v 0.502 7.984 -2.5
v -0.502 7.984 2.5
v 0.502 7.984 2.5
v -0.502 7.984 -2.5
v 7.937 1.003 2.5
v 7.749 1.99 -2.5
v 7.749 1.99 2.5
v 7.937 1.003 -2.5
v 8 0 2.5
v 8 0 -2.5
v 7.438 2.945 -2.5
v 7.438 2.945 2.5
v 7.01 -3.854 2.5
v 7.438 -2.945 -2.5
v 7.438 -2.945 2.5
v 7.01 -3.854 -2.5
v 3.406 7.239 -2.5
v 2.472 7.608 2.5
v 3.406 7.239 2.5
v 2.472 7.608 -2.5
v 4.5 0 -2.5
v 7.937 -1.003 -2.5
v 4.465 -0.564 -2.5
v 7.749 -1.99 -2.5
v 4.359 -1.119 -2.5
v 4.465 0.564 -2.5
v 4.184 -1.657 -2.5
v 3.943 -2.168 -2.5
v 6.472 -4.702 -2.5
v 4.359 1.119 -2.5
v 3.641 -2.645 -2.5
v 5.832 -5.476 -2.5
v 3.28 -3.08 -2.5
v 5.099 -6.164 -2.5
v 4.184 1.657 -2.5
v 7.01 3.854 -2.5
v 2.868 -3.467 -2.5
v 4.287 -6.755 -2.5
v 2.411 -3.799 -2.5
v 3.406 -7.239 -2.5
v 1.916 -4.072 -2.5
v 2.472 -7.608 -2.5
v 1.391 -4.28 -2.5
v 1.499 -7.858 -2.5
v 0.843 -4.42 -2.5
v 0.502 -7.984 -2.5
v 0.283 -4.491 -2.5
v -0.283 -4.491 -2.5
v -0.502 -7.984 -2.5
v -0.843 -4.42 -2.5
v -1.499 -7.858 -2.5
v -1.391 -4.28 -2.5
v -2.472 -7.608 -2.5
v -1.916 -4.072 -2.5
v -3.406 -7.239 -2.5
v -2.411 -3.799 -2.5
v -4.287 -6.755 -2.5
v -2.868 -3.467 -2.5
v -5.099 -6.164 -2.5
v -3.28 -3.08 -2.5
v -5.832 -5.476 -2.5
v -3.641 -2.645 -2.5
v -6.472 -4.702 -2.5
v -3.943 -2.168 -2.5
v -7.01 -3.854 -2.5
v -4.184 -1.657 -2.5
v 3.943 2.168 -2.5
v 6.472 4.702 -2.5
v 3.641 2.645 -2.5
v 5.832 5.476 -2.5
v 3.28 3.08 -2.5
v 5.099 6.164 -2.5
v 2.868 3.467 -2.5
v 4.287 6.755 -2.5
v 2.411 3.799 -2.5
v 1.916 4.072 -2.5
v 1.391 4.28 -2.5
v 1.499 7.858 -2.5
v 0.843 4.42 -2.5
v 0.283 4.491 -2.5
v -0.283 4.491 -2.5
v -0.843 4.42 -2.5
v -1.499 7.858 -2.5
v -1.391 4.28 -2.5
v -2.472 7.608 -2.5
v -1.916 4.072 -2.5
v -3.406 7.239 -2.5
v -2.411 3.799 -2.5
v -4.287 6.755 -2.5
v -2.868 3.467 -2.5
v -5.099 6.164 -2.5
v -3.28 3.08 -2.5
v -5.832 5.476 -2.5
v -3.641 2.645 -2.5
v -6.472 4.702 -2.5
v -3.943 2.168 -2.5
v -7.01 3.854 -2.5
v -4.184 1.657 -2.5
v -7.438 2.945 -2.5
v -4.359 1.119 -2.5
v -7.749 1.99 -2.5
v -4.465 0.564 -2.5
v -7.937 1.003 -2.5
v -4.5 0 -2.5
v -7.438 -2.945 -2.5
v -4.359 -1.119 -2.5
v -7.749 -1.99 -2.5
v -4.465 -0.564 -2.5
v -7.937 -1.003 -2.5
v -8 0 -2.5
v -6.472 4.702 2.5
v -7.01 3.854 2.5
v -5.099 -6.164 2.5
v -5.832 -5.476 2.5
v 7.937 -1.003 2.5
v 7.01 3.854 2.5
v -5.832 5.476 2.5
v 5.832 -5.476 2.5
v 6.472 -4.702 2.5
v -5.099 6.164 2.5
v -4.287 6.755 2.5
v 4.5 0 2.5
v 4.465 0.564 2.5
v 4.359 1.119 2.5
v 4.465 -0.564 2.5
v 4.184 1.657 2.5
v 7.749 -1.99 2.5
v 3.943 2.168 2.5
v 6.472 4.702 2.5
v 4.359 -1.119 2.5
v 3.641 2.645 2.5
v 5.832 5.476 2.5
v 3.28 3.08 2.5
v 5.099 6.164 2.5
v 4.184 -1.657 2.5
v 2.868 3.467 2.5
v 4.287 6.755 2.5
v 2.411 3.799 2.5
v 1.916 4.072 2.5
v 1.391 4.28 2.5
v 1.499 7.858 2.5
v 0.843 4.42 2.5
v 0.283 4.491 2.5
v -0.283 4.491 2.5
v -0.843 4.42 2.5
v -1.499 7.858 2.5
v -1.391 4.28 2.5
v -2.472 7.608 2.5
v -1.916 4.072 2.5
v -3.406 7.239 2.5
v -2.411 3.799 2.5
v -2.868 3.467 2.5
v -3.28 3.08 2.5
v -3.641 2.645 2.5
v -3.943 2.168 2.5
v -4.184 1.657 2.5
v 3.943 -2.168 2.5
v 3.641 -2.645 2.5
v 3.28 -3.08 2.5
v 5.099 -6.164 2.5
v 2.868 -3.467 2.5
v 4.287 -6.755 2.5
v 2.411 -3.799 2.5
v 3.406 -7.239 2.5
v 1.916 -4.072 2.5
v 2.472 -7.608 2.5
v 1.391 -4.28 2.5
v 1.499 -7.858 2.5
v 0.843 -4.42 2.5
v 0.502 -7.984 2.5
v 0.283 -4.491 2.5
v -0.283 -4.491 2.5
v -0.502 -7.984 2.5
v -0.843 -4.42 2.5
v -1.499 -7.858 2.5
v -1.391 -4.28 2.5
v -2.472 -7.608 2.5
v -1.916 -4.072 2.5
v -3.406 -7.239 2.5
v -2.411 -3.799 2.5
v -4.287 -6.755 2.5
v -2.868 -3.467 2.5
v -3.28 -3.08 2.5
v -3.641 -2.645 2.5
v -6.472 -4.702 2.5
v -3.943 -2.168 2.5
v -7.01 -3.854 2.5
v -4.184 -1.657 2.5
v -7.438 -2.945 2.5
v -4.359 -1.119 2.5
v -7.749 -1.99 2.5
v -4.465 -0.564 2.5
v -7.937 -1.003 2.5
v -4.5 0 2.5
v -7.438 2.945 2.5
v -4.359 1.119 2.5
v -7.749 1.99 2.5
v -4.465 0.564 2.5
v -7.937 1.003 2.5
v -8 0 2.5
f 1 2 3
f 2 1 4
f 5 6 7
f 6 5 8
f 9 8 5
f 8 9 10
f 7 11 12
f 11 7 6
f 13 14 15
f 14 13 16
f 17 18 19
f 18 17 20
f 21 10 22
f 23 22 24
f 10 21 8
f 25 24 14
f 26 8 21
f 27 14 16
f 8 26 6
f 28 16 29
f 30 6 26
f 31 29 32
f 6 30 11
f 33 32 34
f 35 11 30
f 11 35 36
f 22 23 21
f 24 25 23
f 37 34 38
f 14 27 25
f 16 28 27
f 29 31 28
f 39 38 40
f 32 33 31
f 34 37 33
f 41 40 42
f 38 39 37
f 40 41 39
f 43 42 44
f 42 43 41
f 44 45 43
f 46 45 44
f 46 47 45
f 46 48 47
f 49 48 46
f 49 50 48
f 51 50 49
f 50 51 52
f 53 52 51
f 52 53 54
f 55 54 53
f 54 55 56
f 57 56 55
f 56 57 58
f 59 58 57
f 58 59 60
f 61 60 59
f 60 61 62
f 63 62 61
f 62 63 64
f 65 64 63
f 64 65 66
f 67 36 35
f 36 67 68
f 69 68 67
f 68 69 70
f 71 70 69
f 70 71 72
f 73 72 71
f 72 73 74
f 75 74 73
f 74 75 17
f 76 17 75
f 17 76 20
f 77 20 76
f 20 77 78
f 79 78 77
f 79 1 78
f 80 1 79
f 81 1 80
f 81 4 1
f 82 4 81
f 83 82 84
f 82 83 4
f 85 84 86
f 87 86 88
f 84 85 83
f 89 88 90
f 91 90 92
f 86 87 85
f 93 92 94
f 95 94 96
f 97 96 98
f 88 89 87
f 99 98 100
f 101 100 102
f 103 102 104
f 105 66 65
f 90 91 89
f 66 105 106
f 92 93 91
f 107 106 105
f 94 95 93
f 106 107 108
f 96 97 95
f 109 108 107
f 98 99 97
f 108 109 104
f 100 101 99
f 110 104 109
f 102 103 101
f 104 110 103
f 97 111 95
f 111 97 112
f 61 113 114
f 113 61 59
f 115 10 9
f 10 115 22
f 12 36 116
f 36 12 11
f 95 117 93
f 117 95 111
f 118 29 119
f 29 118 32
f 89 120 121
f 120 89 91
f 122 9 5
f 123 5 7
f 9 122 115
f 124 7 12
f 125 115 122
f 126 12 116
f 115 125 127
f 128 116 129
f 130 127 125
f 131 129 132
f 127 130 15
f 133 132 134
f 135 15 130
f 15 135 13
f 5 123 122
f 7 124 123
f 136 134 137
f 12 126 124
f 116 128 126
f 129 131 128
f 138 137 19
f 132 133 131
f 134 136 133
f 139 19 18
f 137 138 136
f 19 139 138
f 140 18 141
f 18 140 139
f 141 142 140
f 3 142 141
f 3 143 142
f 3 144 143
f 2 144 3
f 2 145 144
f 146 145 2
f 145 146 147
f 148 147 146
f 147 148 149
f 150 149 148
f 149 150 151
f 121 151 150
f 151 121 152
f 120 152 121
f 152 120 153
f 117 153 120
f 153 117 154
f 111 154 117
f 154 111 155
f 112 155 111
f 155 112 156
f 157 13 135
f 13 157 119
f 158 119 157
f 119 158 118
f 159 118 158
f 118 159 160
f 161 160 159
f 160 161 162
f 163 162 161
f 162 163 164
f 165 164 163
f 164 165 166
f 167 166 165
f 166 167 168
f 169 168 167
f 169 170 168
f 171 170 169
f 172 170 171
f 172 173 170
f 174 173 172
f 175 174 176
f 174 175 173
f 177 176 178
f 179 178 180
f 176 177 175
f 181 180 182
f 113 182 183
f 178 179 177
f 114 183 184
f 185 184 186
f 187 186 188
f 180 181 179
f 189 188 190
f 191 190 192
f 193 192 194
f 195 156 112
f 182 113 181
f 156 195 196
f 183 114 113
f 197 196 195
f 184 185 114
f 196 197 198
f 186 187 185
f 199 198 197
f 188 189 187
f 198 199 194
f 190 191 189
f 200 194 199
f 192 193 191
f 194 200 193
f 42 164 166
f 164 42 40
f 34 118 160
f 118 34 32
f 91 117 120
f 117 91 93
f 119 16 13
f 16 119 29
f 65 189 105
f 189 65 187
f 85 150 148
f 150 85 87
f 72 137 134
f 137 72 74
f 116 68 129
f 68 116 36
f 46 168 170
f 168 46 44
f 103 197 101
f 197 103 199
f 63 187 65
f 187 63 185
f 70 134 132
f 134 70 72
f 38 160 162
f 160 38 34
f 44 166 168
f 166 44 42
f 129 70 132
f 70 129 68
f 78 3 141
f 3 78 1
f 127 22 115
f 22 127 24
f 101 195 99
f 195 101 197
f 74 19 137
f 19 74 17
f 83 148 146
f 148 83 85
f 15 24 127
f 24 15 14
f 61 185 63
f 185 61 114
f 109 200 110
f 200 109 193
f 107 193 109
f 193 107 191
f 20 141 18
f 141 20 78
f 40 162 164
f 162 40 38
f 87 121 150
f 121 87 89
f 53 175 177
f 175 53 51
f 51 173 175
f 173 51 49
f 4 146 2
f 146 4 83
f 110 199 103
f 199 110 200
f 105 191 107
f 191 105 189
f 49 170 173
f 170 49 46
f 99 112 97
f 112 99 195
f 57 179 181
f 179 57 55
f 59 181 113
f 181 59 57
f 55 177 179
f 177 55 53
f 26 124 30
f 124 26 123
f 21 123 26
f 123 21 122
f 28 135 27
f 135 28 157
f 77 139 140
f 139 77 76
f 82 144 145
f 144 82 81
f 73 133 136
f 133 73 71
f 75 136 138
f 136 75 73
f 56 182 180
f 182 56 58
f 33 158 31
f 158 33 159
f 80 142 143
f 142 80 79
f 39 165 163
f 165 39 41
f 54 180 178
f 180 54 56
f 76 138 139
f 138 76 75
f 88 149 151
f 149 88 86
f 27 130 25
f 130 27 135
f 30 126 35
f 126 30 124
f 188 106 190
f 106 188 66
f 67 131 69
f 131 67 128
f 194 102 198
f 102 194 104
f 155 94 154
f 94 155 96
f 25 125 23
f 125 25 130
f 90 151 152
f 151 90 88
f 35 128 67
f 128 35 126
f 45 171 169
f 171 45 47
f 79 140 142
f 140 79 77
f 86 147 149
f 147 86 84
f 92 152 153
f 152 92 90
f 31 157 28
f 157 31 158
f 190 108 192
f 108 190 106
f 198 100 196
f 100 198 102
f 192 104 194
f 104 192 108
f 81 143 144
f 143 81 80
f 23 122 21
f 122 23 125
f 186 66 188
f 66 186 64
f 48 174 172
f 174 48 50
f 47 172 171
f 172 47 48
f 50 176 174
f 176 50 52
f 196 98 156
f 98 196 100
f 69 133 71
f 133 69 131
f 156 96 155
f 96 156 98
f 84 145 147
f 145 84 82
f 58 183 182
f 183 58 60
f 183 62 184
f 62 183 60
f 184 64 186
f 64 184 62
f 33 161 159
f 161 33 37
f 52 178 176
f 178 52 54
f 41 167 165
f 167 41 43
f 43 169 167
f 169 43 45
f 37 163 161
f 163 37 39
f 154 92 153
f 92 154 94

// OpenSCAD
$fn = 50;


difference() {
	union() {
		translate(v = [0, 0, -2.5000000000]) {
			cylinder(h = 5, r = 8.0000000000);
		}
	}
	union() {
		translate(v = [0, 0, -100.0000000000]) {
			cylinder(h = 200, r = 4.5000000000);
		}
	}
}
